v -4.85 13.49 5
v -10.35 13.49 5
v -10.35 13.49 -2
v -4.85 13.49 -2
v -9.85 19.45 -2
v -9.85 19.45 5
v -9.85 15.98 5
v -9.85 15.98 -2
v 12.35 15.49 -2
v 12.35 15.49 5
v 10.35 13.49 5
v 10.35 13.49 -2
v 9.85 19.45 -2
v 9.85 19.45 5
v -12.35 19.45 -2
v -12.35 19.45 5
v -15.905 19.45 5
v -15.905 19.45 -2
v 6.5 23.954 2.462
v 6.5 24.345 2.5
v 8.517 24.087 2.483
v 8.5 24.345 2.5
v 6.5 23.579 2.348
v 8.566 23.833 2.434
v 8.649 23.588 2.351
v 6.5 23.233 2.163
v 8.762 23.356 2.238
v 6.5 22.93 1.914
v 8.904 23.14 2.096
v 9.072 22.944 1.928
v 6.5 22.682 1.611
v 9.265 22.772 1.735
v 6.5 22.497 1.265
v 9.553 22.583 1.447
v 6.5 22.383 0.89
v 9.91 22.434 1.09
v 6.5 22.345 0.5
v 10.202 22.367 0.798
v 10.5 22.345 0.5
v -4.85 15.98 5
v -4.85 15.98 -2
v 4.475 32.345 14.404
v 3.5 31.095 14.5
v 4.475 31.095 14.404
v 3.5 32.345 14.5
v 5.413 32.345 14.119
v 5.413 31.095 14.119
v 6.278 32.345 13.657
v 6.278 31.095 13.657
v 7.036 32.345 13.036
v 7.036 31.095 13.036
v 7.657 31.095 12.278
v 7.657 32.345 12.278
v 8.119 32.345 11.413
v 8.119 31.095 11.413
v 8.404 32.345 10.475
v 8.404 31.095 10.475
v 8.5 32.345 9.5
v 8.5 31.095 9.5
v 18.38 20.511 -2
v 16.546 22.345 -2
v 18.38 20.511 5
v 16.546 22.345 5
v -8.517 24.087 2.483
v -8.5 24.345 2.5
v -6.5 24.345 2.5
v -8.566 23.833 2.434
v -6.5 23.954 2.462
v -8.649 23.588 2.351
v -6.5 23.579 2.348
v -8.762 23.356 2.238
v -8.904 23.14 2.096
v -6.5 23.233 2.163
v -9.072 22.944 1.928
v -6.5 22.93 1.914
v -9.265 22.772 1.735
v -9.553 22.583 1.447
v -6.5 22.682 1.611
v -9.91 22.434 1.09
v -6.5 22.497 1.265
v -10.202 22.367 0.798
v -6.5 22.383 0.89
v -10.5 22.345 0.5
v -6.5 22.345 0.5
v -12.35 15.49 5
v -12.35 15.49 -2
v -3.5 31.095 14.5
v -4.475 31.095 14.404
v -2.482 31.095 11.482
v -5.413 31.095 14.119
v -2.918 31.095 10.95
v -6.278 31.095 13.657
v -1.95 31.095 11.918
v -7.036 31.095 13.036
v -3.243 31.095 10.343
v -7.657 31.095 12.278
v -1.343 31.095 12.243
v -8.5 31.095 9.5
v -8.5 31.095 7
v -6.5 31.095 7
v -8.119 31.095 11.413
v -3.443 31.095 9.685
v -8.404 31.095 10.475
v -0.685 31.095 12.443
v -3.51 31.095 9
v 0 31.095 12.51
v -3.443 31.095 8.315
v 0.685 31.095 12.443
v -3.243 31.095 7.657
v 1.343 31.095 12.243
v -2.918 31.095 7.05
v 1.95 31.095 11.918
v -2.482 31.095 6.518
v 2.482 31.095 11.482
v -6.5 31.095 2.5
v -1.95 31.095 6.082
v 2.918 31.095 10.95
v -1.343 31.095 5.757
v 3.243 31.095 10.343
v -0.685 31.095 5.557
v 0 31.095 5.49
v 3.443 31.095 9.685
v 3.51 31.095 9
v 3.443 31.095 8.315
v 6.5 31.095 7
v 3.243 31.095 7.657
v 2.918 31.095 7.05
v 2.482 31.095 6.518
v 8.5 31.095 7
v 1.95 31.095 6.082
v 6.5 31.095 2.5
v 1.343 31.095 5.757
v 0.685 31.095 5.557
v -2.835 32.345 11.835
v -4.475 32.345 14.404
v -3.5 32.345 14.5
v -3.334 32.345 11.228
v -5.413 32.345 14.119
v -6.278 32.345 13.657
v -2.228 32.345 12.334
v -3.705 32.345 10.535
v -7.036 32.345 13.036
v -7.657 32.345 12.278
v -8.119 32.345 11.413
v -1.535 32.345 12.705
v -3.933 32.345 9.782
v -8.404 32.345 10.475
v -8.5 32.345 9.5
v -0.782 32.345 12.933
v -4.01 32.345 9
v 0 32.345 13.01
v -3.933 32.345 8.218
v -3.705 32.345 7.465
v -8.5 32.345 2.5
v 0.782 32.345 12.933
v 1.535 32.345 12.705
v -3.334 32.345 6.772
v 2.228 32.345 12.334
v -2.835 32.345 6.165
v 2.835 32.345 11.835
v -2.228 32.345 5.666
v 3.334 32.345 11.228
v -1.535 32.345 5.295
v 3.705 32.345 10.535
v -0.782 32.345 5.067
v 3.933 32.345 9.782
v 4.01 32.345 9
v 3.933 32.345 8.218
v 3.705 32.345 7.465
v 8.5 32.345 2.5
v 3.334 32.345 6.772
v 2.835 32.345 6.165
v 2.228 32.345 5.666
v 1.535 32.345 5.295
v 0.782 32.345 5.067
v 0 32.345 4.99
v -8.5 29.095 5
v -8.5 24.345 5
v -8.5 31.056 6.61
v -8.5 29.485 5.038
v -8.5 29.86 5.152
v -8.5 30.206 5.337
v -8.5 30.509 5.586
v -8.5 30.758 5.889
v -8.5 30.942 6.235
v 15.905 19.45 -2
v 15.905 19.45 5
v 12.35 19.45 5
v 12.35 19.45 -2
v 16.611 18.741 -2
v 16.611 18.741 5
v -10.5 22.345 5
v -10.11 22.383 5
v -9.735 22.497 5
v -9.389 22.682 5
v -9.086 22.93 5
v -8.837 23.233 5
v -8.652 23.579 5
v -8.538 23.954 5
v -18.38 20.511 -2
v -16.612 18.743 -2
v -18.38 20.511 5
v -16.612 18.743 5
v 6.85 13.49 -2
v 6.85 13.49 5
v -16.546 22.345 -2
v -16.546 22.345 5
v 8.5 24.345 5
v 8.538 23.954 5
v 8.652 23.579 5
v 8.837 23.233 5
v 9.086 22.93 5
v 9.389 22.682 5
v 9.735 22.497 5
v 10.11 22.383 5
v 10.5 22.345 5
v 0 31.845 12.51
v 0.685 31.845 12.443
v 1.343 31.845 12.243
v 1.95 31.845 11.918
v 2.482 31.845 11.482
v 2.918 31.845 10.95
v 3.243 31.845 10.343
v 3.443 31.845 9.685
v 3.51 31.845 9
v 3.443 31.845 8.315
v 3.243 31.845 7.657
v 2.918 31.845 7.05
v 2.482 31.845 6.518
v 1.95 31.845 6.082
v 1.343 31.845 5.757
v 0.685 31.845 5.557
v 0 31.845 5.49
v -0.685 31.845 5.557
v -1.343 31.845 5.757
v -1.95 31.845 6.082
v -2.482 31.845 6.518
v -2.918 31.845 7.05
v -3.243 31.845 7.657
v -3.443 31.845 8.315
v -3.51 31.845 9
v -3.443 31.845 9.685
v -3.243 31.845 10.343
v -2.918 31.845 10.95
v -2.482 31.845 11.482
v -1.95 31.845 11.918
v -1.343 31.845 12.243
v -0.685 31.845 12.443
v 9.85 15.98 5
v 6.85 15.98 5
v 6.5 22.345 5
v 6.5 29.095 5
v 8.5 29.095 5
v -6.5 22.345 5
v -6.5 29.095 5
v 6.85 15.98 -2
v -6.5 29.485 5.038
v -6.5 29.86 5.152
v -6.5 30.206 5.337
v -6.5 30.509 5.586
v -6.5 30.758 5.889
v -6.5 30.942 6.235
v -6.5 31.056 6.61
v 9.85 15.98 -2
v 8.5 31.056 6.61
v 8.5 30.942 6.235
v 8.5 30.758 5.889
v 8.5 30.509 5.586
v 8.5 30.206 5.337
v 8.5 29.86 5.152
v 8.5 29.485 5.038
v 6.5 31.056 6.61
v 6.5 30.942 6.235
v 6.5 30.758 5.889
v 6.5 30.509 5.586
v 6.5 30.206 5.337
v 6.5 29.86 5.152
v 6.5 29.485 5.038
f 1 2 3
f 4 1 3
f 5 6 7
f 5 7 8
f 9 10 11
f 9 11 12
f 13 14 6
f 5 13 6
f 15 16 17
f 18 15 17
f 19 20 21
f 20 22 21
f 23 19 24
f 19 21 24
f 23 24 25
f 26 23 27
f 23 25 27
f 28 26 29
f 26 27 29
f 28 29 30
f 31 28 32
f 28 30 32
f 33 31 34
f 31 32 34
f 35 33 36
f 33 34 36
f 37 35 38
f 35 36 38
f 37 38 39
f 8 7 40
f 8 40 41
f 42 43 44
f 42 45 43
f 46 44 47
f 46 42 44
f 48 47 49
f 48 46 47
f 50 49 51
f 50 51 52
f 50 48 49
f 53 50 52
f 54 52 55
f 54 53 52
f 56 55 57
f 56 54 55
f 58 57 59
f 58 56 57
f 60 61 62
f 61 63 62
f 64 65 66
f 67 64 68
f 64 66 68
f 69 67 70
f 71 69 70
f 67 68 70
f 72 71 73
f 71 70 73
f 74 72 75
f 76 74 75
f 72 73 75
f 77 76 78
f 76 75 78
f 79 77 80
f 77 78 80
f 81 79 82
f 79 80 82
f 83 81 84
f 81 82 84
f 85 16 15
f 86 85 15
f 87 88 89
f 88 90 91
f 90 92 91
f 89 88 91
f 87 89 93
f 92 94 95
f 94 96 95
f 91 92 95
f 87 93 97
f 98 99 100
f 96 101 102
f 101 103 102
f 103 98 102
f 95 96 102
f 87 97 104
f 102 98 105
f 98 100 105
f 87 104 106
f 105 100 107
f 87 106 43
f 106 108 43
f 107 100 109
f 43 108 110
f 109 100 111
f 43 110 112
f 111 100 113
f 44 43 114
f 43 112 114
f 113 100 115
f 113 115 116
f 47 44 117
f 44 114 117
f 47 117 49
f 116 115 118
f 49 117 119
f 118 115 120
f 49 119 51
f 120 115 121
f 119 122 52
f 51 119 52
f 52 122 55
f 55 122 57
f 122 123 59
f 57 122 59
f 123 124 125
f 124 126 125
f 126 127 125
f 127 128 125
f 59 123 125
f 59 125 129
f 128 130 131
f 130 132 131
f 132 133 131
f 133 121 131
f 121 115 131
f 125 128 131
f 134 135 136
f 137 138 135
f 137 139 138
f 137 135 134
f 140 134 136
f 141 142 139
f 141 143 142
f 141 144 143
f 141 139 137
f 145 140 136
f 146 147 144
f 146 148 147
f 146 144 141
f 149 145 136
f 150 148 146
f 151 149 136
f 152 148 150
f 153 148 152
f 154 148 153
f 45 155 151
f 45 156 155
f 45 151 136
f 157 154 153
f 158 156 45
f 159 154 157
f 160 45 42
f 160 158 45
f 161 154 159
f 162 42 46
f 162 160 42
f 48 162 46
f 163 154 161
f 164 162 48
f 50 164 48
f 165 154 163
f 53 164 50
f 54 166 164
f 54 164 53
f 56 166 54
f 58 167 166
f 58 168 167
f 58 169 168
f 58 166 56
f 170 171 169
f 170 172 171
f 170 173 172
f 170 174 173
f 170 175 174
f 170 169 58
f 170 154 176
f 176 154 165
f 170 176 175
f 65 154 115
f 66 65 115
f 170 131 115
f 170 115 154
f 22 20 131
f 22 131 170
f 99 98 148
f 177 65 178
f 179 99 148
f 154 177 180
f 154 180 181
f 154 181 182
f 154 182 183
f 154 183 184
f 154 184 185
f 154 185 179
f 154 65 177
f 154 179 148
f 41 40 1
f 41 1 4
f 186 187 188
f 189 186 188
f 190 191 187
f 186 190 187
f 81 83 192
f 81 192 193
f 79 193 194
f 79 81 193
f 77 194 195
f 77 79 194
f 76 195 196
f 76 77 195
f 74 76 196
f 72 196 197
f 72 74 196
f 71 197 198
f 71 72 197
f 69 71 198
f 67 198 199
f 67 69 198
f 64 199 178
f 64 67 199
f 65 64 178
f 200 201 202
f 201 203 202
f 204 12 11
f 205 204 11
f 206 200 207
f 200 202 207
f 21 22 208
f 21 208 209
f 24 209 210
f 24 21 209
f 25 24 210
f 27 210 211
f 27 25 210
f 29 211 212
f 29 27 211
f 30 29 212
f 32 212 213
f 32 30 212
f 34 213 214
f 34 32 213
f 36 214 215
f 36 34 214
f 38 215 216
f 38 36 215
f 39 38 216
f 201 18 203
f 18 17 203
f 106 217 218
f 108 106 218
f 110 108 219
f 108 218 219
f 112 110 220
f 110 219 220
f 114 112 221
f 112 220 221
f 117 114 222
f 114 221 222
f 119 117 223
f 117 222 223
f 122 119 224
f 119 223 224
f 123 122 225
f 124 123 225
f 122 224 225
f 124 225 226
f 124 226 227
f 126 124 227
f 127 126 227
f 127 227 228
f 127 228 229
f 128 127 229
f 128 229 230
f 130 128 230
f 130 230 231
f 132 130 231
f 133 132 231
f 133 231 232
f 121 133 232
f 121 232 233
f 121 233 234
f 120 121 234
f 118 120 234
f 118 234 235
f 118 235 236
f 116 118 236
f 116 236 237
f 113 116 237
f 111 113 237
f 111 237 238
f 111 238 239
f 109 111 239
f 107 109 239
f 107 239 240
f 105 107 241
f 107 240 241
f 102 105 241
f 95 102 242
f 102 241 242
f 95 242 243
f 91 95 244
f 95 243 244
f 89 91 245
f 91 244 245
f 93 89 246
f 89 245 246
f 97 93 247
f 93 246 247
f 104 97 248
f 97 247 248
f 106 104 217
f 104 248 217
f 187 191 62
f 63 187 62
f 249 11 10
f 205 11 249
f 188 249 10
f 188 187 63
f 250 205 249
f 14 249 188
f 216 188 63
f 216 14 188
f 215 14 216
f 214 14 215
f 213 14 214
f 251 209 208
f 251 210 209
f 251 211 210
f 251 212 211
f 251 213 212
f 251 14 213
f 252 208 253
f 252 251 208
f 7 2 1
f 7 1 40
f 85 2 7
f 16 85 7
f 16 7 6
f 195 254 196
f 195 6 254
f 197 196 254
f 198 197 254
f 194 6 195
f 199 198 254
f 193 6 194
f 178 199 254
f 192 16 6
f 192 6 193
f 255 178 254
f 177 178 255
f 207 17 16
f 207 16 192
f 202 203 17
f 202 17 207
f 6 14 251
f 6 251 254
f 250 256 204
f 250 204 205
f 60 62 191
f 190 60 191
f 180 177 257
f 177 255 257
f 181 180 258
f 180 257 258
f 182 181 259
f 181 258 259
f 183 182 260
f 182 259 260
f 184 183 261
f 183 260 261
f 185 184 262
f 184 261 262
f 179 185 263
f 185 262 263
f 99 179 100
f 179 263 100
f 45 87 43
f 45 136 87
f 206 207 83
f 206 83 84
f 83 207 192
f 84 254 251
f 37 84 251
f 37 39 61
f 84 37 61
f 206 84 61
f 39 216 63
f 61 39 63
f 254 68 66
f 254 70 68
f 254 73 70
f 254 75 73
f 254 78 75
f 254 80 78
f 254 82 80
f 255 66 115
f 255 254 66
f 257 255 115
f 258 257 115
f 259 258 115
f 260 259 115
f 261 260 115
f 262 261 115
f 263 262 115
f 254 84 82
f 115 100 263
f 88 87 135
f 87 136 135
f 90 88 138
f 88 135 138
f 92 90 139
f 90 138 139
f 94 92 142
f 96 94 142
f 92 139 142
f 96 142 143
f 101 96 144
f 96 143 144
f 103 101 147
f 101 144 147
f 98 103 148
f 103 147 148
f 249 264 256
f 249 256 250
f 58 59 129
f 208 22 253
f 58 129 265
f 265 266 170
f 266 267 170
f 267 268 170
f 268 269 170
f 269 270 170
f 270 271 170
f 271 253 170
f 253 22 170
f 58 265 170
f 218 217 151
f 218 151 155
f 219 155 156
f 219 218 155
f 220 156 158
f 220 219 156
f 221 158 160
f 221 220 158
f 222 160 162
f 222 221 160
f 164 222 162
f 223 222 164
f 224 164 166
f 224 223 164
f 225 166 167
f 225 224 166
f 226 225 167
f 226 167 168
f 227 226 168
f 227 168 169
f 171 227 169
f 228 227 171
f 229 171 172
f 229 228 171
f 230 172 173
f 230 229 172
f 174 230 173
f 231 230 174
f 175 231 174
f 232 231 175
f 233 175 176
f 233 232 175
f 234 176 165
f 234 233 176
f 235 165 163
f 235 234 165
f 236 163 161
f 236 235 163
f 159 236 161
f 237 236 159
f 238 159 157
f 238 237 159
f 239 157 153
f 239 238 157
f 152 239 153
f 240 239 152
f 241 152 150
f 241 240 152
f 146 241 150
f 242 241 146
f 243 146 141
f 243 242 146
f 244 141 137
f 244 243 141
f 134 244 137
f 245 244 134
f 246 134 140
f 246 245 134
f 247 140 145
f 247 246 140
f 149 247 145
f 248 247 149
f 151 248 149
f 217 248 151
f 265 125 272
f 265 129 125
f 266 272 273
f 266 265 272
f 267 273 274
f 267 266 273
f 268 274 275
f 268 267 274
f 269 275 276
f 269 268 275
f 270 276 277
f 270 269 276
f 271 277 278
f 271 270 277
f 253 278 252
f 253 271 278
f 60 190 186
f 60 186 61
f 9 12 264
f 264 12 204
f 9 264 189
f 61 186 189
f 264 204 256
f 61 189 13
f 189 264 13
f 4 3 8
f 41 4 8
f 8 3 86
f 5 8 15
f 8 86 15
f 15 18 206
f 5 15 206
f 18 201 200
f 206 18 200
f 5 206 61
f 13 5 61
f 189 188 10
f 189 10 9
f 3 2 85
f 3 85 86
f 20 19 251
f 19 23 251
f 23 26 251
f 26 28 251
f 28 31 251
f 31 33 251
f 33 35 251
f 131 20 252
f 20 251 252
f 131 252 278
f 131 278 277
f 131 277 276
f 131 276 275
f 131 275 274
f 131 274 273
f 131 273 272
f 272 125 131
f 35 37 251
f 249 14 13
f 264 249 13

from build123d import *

# Parameters (mm, degrees)
BOSS_EXTRUDE2_DEPTH = 5
BOSS_EXTRUDE3_DEPTH = 2
SKETCH8_W           = 2.5
SKETCH8_H           = 7
BOSS_EXTRUDE4_DEPTH = 5.96
SKETCH10_W          = 7
SKETCH10_H          = 2.49
BOSS_EXTRUDE5_DEPTH = 3
SKETCH11_W          = 7
SKETCH11_H          = 2.49
BOSS_EXTRUDE6_DEPTH = 5
SKETCH12_W          = 17
SKETCH12_H          = 2.5
BOSS_EXTRUDE7_DEPTH = 10
CUT_EXTRUDE7_REACH  = 39.855
SKETCH14_W          = 13
SKETCH14_H          = 8.75
SKETCH16_W          = 17
SKETCH16_H          = 1.25
BOSS_EXTRUDE8_DEPTH = 9.5
CUT_EXTRUDE8_REACH  = 32.06
SKETCH17_R          = 3.51
FILLET7_R           = 2
FILLET8_R           = 5
FILLET9_R           = 5
CHAMFER1_SIZE       = 2
CHAMFER2_SIZE       = 2
FILLET11_R          = 2
FILLET12_R          = 2
FILLET13_R          = 2
FILLET14_R          = 2
FILLET16_R          = 2
CHAMFER3_SIZE       = 0.5


with BuildPart() as part:
    # Sketch2 → Boss-Extrude2 (new body)
    with BuildSketch(Plane.XY):
        Polygon((15.905331571, 19.450007488), (-15.905331571, 19.450007488), (-16.612438353, 18.742900707), (-18.380205305, 20.51066766), (-16.54629868, 22.344574285), (16.54629868, 22.344574285), (18.3802029, 20.510670065), (16.610591633, 18.741058798), align=None)
    extrude(amount=BOSS_EXTRUDE2_DEPTH)

    # Sketch2<2> → Boss-Extrude3 (add)
    with BuildSketch(Plane.XY):
        Polygon((15.905331571, 19.450007488), (-15.905331571, 19.450007488), (-16.612438353, 18.742900707), (-18.380205305, 20.51066766), (-16.54629868, 22.344574285), (16.54629868, 22.344574285), (18.3802029, 20.510670065), (16.610591633, 18.741058798), align=None)
    extrude(amount=-BOSS_EXTRUDE3_DEPTH)

    # Sketch8 → Boss-Extrude4 (add)
    with BuildSketch(Plane(origin=(0, 19.450007488, 0), x_dir=(-1, 0, 0), z_dir=(0, -1, 0))):
        with Locations((11.1, -1.5)):
            Rectangle(SKETCH8_W, SKETCH8_H)
        with Locations((-11.1, -1.5)):
            Rectangle(SKETCH8_W, SKETCH8_H)
    extrude(amount=BOSS_EXTRUDE4_DEPTH)

    # Sketch10 → Boss-Extrude5 (add)
    with BuildSketch(Plane.ZY.offset(-9.85)):
        with Locations((1.5, 14.735007488)):
            Rectangle(SKETCH10_W, SKETCH10_H)
    extrude(amount=BOSS_EXTRUDE5_DEPTH)

    # Sketch11 → Boss-Extrude6 (add)
    with BuildSketch(Plane(origin=(-9.85, 0, 0), x_dir=(0, 0, -1), z_dir=(1, 0, 0))):
        with Locations((-1.5, 14.735007488)):
            Rectangle(SKETCH11_W, SKETCH11_H)
    extrude(amount=BOSS_EXTRUDE6_DEPTH)

    # Sketch12 → Boss-Extrude7 (add)
    with BuildSketch(Plane(origin=(0, 22.344574285, 0), x_dir=(1, 0, 0), z_dir=(0, 1, 0))):
        with Locations((0, -3.75)):
            Rectangle(SKETCH12_W, SKETCH12_H)
    extrude(amount=BOSS_EXTRUDE7_DEPTH)

    # Sketch14 → Cut-Extrude7 (cut, up to next)
    with BuildSketch(Plane.XY.offset(5), mode=Mode.PRIVATE) as cut_extrude7_sk1:
        with Locations((0, 26.719574285)):
            Rectangle(SKETCH14_W, SKETCH14_H)
    cut_extrude7_tool1 = extrude(cut_extrude7_sk1.sketch, amount=-CUT_EXTRUDE7_REACH, mode=Mode.PRIVATE) & part.part
    add(cut_extrude7_tool1.solids().sort_by_distance((0, 26.719574, 5))[0], mode=Mode.SUBTRACT)

    # Sketch16 → Boss-Extrude8 (add)
    with BuildSketch(Plane.XY.offset(5)):
        with Locations((0, 31.719574285)):
            Rectangle(SKETCH16_W, SKETCH16_H)
    extrude(amount=BOSS_EXTRUDE8_DEPTH)

    # Sketch17 → Cut-Extrude8 (cut, up to next)
    with BuildSketch(Plane(origin=(0, 32.344574285, 0), x_dir=(1, 0, 0), z_dir=(0, 1, 0)), mode=Mode.PRIVATE) as cut_extrude8_sk1:
        with Locations((0, -9)):
            Circle(SKETCH17_R)
    cut_extrude8_tool1 = extrude(cut_extrude8_sk1.sketch, amount=-CUT_EXTRUDE8_REACH, mode=Mode.PRIVATE) & part.part
    add(cut_extrude8_tool1.solids().sort_by_distance((0, 32.344574, 9))[0], mode=Mode.SUBTRACT)

    # Fillet7
    fillet7_edges = [part.edges().sort_by_distance(p)[0] for p in [
        (7.5, 31.094574285, 5),
    ]]
    fillet(fillet7_edges, radius=FILLET7_R)

    # Fillet8
    fillet8_edges = [part.edges().sort_by_distance(p)[0] for p in [
        (8.5, 31.719574285, 14.5),
    ]]
    fillet(fillet8_edges, radius=FILLET8_R)

    # Fillet9
    fillet9_edges = [part.edges().sort_by_distance(p)[0] for p in [
        (-8.5, 31.719574285, 14.5),
    ]]
    fillet(fillet9_edges, radius=FILLET9_R)

    # Chamfer1
    chamfer1_edges = [part.edges().sort_by_distance(p)[0] for p in [
        (-12.35, 13.490007488, 1.5),
    ]]
    chamfer(chamfer1_edges, length=CHAMFER1_SIZE)

    # Chamfer2
    chamfer2_edges = [part.edges().sort_by_distance(p)[0] for p in [
        (12.35, 13.490007488, 1.5),
    ]]
    chamfer(chamfer2_edges, length=CHAMFER2_SIZE)

    # Fillet11
    fillet11_edges = [part.edges().sort_by_distance(p)[0] for p in [
        (-8.5, 22.344574285, 3.75),
    ]]
    fillet(fillet11_edges, radius=FILLET11_R)

    # Fillet12
    fillet12_edges = [part.edges().sort_by_distance(p)[0] for p in [
        (8.5, 22.344574285, 3.75),
    ]]
    fillet(fillet12_edges, radius=FILLET12_R)

    # Fillet13
    fillet13_edges = [part.edges().sort_by_distance(p)[0] for p in [
        (8.5, 22.344574285, 2.5),
    ]]
    fillet(fillet13_edges, radius=FILLET13_R)

    # Fillet14
    fillet14_edges = [part.edges().sort_by_distance(p)[0] for p in [
        (-8.5, 22.344574285, 2.5),
    ]]
    fillet(fillet14_edges, radius=FILLET14_R)

    # Fillet16
    fillet16_edges = [part.edges().sort_by_distance(p)[0] for p in [
        (-7.5, 31.094574285, 5),
    ]]
    fillet(fillet16_edges, radius=FILLET16_R)

    # Chamfer3
    chamfer3_edges = [part.edges().sort_by_distance(p)[0] for p in [
        (-3.51, 32.344574285, 9),
    ]]
    chamfer(chamfer3_edges, length=CHAMFER3_SIZE)


solid = part.part
